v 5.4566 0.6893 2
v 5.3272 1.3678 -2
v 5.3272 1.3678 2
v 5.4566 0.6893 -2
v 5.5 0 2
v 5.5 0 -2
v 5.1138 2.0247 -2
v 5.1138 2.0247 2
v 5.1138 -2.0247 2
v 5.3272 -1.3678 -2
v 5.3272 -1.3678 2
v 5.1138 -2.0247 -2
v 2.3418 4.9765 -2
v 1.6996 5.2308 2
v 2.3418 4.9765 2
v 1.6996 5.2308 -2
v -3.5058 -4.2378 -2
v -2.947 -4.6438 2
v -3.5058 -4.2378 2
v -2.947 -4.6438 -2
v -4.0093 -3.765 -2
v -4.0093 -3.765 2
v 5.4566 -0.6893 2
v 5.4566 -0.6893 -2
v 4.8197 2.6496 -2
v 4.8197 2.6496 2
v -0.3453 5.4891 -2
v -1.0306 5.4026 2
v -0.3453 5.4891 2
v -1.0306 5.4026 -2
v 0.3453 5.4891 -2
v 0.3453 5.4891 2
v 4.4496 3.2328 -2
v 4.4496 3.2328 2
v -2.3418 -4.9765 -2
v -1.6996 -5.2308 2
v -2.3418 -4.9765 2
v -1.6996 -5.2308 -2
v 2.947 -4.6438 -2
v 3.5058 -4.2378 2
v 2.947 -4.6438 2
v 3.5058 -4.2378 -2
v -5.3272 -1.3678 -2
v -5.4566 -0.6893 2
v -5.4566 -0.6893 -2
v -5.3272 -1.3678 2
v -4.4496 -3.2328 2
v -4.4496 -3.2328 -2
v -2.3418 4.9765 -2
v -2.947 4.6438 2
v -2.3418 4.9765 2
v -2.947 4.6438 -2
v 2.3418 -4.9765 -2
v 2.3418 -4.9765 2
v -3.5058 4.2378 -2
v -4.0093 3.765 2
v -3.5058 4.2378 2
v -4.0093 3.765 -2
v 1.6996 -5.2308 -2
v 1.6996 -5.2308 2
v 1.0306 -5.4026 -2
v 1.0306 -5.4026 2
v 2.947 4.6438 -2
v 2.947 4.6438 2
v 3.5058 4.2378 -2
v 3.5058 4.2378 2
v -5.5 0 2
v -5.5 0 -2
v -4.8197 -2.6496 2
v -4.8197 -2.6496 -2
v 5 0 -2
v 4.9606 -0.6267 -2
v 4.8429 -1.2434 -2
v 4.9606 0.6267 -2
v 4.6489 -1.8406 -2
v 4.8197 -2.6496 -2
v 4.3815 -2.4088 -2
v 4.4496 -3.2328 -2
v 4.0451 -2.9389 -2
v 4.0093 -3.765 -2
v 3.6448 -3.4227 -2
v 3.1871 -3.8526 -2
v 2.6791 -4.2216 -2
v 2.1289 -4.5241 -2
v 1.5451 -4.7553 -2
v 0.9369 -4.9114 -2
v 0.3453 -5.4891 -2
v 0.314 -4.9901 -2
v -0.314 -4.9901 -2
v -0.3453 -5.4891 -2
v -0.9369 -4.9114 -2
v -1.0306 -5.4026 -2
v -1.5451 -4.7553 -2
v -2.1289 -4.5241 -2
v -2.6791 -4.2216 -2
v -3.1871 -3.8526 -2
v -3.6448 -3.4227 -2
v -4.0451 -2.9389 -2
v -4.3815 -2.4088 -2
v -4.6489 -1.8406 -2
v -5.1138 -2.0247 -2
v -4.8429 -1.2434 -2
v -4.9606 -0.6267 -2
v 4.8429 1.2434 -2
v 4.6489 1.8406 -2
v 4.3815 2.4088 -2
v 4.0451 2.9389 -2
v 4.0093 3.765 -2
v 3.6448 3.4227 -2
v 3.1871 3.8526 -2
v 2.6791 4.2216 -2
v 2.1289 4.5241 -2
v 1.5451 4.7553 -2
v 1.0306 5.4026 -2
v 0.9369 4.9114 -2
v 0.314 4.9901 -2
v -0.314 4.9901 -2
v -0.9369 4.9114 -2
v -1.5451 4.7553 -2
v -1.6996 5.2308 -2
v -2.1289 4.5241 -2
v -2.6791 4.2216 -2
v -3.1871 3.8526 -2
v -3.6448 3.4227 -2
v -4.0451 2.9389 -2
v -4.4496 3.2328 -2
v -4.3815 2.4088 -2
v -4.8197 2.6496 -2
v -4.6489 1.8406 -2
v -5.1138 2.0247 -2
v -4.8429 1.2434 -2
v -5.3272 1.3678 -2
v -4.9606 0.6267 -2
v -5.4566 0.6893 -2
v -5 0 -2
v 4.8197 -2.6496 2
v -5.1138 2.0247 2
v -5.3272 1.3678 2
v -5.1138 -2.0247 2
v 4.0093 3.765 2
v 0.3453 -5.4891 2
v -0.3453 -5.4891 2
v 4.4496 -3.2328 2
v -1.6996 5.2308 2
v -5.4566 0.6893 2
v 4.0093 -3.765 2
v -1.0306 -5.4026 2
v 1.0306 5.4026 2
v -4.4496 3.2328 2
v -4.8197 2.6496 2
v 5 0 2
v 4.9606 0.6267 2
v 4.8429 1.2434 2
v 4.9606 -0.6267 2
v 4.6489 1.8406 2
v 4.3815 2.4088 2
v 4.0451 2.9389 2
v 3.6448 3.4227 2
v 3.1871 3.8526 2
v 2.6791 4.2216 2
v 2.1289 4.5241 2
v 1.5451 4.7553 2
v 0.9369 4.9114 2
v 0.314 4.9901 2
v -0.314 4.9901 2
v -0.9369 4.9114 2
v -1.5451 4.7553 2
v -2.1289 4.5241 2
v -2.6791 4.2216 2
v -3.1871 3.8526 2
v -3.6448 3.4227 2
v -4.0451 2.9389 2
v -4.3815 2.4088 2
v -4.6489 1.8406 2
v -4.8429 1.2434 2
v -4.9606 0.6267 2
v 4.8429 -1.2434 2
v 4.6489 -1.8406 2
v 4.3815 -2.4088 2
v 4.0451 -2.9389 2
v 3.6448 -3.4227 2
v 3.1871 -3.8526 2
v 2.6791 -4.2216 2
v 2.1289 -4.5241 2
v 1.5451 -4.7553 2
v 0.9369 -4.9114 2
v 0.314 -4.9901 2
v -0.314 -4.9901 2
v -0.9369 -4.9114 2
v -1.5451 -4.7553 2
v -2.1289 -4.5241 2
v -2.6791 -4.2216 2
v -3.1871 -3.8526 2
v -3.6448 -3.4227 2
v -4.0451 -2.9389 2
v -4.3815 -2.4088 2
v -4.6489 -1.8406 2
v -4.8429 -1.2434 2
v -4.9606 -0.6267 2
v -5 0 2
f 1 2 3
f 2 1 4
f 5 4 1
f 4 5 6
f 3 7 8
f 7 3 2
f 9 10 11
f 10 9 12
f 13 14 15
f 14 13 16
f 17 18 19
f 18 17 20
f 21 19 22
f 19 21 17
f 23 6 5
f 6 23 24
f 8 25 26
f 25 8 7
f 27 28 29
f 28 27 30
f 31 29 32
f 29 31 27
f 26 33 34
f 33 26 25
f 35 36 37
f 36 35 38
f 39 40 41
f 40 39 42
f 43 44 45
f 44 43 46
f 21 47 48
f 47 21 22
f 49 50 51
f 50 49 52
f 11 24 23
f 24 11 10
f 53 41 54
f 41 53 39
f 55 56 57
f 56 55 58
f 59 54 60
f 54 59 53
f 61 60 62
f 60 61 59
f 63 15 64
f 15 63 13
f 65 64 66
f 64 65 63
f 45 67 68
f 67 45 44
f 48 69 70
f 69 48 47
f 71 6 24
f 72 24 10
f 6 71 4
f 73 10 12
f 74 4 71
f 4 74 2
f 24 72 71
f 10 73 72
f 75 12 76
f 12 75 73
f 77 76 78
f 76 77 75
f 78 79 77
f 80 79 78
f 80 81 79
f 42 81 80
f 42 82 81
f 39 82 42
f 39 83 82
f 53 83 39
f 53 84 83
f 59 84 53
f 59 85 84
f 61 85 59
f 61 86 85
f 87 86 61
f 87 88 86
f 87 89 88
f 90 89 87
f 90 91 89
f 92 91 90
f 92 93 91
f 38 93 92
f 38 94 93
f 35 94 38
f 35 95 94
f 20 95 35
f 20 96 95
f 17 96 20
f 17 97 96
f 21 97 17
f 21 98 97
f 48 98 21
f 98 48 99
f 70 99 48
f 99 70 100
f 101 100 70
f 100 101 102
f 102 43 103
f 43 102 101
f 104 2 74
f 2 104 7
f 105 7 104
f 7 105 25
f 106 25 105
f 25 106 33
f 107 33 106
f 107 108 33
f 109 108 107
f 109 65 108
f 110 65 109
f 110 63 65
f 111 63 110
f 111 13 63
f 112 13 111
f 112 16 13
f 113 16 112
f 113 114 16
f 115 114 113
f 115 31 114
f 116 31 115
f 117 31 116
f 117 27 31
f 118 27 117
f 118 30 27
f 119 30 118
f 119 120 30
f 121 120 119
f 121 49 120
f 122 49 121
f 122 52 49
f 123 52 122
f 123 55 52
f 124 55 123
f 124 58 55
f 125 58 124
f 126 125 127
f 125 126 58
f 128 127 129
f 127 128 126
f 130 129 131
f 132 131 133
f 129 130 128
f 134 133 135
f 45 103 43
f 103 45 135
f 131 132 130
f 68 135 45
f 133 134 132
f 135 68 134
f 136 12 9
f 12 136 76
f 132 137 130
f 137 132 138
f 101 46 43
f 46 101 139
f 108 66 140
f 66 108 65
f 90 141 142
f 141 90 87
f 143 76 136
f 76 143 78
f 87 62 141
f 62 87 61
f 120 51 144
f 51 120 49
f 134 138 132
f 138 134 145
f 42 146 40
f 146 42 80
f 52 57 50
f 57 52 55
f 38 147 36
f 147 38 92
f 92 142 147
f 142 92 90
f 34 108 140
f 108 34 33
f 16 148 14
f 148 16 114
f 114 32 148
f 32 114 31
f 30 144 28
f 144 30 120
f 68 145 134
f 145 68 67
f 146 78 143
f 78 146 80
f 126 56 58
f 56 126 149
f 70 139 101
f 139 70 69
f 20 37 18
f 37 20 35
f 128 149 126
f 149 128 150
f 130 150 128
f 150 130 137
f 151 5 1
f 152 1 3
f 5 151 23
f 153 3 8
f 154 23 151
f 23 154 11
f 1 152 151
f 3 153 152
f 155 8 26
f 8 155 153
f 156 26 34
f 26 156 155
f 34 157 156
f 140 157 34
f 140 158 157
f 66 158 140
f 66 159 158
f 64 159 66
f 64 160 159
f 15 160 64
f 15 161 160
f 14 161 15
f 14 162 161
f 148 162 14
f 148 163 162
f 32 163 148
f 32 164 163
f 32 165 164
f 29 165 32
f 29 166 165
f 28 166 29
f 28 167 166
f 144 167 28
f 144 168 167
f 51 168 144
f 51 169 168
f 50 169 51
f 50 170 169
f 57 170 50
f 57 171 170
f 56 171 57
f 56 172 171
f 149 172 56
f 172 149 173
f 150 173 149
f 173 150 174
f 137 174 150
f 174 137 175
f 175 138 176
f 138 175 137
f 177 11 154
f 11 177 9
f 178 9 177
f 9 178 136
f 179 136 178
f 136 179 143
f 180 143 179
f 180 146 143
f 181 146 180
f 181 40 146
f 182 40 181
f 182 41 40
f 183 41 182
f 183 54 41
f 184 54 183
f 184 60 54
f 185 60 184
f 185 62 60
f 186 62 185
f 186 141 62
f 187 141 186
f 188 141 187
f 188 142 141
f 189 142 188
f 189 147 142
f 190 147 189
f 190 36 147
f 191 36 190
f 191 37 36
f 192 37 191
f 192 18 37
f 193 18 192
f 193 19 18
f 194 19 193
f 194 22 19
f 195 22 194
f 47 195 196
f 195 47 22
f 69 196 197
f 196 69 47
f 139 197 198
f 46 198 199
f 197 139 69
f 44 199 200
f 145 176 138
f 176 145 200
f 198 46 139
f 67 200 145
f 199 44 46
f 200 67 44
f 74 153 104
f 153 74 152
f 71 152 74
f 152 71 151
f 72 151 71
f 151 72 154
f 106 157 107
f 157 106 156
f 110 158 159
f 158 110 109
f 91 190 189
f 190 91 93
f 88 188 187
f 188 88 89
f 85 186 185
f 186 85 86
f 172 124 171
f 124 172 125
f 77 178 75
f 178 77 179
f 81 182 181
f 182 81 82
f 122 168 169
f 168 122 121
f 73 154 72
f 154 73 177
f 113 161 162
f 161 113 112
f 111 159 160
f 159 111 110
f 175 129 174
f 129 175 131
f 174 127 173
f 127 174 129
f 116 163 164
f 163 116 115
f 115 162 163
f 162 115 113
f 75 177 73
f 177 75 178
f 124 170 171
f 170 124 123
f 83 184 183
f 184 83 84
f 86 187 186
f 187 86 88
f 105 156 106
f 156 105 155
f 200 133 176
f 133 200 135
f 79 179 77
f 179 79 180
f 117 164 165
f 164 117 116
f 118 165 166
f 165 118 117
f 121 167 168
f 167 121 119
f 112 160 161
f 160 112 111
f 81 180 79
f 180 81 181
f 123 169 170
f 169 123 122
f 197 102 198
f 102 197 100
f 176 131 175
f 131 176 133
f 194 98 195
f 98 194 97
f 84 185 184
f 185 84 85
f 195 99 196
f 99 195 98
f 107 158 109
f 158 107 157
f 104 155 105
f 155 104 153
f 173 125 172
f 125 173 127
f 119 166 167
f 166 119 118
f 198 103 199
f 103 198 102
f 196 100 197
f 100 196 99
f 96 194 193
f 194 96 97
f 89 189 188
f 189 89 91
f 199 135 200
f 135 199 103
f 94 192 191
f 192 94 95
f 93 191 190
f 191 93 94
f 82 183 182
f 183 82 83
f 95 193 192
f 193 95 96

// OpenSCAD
$fn = 50;


difference() {
	union() {
		translate(v = [0, 0, -2.0000000000]) {
			cylinder(h = 4, r = 5.5000000000);
		}
	}
	union() {
		translate(v = [0, 0, -100.0000000000]) {
			cylinder(h = 200, r = 5.0000000000);
		}
	}
}
